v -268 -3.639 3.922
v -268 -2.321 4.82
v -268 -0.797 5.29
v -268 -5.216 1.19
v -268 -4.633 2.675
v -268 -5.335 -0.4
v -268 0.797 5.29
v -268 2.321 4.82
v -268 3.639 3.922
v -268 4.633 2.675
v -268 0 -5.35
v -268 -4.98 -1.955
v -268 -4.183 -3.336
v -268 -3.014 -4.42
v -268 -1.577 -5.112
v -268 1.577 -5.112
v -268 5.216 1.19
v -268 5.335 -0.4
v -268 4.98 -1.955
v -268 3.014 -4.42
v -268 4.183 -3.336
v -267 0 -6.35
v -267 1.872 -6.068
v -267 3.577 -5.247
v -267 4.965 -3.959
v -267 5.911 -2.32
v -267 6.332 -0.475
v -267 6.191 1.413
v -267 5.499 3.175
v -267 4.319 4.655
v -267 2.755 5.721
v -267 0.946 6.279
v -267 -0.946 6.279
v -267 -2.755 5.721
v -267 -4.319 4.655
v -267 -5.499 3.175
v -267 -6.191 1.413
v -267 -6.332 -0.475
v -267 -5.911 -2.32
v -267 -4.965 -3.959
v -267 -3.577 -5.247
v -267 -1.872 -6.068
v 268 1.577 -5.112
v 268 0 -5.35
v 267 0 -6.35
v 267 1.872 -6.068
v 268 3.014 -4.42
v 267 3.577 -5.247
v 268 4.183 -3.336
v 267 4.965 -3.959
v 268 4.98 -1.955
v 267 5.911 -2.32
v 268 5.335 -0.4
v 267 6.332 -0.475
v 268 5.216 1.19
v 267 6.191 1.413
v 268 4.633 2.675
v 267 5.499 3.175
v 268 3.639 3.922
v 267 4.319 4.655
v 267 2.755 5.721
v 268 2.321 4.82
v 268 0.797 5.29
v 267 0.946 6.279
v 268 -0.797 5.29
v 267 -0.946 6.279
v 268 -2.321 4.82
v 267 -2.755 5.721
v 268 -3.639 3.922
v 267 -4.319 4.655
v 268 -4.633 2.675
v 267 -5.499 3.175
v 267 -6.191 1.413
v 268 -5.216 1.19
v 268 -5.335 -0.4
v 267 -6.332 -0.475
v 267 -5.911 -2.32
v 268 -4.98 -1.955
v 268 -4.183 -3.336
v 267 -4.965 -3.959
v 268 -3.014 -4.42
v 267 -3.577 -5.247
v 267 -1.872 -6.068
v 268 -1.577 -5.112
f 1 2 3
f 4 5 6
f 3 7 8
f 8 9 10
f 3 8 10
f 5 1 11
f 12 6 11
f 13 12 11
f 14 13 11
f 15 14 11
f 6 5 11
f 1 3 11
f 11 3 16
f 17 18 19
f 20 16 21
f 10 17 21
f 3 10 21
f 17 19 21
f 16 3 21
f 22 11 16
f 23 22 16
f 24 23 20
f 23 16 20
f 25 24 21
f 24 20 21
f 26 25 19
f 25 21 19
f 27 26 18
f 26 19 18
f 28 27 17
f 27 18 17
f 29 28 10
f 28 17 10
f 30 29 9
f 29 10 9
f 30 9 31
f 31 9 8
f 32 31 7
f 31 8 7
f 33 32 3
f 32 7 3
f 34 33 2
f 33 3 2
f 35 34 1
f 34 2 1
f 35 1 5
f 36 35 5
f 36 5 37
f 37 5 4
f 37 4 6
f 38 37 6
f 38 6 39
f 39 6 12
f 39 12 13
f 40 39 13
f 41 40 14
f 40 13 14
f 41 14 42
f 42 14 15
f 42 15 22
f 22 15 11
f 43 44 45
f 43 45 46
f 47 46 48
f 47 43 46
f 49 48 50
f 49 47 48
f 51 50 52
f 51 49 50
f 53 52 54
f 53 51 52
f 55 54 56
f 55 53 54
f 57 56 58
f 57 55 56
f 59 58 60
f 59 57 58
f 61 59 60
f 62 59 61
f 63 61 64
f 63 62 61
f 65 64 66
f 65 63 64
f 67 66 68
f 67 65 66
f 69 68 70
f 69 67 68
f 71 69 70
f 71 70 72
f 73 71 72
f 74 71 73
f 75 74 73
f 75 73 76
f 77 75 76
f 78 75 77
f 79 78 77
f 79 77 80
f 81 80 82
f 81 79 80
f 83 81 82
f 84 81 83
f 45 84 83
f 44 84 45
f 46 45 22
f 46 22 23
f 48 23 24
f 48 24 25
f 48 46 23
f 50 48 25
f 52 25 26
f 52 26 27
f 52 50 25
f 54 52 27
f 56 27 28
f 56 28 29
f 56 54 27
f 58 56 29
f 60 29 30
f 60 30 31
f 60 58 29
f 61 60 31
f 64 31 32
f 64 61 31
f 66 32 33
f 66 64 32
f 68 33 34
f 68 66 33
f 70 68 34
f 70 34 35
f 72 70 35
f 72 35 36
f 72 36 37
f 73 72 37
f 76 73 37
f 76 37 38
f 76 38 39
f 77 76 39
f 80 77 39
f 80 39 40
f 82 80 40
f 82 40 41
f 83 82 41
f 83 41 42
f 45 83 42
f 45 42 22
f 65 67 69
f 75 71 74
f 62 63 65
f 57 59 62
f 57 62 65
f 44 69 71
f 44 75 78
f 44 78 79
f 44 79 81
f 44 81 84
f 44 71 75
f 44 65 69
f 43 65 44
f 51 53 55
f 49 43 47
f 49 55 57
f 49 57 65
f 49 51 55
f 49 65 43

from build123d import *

# Parameters (mm, degrees)
SKETCH1_R           = 6.35
BOSS_EXTRUDE1_DEPTH = 268
CHAMFER1_SIZE       = 1
CHAMFER2_SIZE       = 1


with BuildPart() as part:
    # Sketch1 → Boss-Extrude1 (new body, symmetric)
    with BuildSketch(Plane(origin=(0, 0, 0), x_dir=(0, 0, -1), z_dir=(1, 0, 0))):
        Circle(SKETCH1_R)
    extrude(amount=BOSS_EXTRUDE1_DEPTH, both=True)

    # Chamfer1
    chamfer1_edges = [part.edges().sort_by_distance(p)[0] for p in [
        (-268, 0, 6.35),
    ]]
    chamfer(chamfer1_edges, length=CHAMFER1_SIZE)

    # Chamfer2
    chamfer2_edges = [part.edges().sort_by_distance(p)[0] for p in [
        (268, 0, 6.35),
    ]]
    chamfer(chamfer2_edges, length=CHAMFER2_SIZE)


solid = part.part
